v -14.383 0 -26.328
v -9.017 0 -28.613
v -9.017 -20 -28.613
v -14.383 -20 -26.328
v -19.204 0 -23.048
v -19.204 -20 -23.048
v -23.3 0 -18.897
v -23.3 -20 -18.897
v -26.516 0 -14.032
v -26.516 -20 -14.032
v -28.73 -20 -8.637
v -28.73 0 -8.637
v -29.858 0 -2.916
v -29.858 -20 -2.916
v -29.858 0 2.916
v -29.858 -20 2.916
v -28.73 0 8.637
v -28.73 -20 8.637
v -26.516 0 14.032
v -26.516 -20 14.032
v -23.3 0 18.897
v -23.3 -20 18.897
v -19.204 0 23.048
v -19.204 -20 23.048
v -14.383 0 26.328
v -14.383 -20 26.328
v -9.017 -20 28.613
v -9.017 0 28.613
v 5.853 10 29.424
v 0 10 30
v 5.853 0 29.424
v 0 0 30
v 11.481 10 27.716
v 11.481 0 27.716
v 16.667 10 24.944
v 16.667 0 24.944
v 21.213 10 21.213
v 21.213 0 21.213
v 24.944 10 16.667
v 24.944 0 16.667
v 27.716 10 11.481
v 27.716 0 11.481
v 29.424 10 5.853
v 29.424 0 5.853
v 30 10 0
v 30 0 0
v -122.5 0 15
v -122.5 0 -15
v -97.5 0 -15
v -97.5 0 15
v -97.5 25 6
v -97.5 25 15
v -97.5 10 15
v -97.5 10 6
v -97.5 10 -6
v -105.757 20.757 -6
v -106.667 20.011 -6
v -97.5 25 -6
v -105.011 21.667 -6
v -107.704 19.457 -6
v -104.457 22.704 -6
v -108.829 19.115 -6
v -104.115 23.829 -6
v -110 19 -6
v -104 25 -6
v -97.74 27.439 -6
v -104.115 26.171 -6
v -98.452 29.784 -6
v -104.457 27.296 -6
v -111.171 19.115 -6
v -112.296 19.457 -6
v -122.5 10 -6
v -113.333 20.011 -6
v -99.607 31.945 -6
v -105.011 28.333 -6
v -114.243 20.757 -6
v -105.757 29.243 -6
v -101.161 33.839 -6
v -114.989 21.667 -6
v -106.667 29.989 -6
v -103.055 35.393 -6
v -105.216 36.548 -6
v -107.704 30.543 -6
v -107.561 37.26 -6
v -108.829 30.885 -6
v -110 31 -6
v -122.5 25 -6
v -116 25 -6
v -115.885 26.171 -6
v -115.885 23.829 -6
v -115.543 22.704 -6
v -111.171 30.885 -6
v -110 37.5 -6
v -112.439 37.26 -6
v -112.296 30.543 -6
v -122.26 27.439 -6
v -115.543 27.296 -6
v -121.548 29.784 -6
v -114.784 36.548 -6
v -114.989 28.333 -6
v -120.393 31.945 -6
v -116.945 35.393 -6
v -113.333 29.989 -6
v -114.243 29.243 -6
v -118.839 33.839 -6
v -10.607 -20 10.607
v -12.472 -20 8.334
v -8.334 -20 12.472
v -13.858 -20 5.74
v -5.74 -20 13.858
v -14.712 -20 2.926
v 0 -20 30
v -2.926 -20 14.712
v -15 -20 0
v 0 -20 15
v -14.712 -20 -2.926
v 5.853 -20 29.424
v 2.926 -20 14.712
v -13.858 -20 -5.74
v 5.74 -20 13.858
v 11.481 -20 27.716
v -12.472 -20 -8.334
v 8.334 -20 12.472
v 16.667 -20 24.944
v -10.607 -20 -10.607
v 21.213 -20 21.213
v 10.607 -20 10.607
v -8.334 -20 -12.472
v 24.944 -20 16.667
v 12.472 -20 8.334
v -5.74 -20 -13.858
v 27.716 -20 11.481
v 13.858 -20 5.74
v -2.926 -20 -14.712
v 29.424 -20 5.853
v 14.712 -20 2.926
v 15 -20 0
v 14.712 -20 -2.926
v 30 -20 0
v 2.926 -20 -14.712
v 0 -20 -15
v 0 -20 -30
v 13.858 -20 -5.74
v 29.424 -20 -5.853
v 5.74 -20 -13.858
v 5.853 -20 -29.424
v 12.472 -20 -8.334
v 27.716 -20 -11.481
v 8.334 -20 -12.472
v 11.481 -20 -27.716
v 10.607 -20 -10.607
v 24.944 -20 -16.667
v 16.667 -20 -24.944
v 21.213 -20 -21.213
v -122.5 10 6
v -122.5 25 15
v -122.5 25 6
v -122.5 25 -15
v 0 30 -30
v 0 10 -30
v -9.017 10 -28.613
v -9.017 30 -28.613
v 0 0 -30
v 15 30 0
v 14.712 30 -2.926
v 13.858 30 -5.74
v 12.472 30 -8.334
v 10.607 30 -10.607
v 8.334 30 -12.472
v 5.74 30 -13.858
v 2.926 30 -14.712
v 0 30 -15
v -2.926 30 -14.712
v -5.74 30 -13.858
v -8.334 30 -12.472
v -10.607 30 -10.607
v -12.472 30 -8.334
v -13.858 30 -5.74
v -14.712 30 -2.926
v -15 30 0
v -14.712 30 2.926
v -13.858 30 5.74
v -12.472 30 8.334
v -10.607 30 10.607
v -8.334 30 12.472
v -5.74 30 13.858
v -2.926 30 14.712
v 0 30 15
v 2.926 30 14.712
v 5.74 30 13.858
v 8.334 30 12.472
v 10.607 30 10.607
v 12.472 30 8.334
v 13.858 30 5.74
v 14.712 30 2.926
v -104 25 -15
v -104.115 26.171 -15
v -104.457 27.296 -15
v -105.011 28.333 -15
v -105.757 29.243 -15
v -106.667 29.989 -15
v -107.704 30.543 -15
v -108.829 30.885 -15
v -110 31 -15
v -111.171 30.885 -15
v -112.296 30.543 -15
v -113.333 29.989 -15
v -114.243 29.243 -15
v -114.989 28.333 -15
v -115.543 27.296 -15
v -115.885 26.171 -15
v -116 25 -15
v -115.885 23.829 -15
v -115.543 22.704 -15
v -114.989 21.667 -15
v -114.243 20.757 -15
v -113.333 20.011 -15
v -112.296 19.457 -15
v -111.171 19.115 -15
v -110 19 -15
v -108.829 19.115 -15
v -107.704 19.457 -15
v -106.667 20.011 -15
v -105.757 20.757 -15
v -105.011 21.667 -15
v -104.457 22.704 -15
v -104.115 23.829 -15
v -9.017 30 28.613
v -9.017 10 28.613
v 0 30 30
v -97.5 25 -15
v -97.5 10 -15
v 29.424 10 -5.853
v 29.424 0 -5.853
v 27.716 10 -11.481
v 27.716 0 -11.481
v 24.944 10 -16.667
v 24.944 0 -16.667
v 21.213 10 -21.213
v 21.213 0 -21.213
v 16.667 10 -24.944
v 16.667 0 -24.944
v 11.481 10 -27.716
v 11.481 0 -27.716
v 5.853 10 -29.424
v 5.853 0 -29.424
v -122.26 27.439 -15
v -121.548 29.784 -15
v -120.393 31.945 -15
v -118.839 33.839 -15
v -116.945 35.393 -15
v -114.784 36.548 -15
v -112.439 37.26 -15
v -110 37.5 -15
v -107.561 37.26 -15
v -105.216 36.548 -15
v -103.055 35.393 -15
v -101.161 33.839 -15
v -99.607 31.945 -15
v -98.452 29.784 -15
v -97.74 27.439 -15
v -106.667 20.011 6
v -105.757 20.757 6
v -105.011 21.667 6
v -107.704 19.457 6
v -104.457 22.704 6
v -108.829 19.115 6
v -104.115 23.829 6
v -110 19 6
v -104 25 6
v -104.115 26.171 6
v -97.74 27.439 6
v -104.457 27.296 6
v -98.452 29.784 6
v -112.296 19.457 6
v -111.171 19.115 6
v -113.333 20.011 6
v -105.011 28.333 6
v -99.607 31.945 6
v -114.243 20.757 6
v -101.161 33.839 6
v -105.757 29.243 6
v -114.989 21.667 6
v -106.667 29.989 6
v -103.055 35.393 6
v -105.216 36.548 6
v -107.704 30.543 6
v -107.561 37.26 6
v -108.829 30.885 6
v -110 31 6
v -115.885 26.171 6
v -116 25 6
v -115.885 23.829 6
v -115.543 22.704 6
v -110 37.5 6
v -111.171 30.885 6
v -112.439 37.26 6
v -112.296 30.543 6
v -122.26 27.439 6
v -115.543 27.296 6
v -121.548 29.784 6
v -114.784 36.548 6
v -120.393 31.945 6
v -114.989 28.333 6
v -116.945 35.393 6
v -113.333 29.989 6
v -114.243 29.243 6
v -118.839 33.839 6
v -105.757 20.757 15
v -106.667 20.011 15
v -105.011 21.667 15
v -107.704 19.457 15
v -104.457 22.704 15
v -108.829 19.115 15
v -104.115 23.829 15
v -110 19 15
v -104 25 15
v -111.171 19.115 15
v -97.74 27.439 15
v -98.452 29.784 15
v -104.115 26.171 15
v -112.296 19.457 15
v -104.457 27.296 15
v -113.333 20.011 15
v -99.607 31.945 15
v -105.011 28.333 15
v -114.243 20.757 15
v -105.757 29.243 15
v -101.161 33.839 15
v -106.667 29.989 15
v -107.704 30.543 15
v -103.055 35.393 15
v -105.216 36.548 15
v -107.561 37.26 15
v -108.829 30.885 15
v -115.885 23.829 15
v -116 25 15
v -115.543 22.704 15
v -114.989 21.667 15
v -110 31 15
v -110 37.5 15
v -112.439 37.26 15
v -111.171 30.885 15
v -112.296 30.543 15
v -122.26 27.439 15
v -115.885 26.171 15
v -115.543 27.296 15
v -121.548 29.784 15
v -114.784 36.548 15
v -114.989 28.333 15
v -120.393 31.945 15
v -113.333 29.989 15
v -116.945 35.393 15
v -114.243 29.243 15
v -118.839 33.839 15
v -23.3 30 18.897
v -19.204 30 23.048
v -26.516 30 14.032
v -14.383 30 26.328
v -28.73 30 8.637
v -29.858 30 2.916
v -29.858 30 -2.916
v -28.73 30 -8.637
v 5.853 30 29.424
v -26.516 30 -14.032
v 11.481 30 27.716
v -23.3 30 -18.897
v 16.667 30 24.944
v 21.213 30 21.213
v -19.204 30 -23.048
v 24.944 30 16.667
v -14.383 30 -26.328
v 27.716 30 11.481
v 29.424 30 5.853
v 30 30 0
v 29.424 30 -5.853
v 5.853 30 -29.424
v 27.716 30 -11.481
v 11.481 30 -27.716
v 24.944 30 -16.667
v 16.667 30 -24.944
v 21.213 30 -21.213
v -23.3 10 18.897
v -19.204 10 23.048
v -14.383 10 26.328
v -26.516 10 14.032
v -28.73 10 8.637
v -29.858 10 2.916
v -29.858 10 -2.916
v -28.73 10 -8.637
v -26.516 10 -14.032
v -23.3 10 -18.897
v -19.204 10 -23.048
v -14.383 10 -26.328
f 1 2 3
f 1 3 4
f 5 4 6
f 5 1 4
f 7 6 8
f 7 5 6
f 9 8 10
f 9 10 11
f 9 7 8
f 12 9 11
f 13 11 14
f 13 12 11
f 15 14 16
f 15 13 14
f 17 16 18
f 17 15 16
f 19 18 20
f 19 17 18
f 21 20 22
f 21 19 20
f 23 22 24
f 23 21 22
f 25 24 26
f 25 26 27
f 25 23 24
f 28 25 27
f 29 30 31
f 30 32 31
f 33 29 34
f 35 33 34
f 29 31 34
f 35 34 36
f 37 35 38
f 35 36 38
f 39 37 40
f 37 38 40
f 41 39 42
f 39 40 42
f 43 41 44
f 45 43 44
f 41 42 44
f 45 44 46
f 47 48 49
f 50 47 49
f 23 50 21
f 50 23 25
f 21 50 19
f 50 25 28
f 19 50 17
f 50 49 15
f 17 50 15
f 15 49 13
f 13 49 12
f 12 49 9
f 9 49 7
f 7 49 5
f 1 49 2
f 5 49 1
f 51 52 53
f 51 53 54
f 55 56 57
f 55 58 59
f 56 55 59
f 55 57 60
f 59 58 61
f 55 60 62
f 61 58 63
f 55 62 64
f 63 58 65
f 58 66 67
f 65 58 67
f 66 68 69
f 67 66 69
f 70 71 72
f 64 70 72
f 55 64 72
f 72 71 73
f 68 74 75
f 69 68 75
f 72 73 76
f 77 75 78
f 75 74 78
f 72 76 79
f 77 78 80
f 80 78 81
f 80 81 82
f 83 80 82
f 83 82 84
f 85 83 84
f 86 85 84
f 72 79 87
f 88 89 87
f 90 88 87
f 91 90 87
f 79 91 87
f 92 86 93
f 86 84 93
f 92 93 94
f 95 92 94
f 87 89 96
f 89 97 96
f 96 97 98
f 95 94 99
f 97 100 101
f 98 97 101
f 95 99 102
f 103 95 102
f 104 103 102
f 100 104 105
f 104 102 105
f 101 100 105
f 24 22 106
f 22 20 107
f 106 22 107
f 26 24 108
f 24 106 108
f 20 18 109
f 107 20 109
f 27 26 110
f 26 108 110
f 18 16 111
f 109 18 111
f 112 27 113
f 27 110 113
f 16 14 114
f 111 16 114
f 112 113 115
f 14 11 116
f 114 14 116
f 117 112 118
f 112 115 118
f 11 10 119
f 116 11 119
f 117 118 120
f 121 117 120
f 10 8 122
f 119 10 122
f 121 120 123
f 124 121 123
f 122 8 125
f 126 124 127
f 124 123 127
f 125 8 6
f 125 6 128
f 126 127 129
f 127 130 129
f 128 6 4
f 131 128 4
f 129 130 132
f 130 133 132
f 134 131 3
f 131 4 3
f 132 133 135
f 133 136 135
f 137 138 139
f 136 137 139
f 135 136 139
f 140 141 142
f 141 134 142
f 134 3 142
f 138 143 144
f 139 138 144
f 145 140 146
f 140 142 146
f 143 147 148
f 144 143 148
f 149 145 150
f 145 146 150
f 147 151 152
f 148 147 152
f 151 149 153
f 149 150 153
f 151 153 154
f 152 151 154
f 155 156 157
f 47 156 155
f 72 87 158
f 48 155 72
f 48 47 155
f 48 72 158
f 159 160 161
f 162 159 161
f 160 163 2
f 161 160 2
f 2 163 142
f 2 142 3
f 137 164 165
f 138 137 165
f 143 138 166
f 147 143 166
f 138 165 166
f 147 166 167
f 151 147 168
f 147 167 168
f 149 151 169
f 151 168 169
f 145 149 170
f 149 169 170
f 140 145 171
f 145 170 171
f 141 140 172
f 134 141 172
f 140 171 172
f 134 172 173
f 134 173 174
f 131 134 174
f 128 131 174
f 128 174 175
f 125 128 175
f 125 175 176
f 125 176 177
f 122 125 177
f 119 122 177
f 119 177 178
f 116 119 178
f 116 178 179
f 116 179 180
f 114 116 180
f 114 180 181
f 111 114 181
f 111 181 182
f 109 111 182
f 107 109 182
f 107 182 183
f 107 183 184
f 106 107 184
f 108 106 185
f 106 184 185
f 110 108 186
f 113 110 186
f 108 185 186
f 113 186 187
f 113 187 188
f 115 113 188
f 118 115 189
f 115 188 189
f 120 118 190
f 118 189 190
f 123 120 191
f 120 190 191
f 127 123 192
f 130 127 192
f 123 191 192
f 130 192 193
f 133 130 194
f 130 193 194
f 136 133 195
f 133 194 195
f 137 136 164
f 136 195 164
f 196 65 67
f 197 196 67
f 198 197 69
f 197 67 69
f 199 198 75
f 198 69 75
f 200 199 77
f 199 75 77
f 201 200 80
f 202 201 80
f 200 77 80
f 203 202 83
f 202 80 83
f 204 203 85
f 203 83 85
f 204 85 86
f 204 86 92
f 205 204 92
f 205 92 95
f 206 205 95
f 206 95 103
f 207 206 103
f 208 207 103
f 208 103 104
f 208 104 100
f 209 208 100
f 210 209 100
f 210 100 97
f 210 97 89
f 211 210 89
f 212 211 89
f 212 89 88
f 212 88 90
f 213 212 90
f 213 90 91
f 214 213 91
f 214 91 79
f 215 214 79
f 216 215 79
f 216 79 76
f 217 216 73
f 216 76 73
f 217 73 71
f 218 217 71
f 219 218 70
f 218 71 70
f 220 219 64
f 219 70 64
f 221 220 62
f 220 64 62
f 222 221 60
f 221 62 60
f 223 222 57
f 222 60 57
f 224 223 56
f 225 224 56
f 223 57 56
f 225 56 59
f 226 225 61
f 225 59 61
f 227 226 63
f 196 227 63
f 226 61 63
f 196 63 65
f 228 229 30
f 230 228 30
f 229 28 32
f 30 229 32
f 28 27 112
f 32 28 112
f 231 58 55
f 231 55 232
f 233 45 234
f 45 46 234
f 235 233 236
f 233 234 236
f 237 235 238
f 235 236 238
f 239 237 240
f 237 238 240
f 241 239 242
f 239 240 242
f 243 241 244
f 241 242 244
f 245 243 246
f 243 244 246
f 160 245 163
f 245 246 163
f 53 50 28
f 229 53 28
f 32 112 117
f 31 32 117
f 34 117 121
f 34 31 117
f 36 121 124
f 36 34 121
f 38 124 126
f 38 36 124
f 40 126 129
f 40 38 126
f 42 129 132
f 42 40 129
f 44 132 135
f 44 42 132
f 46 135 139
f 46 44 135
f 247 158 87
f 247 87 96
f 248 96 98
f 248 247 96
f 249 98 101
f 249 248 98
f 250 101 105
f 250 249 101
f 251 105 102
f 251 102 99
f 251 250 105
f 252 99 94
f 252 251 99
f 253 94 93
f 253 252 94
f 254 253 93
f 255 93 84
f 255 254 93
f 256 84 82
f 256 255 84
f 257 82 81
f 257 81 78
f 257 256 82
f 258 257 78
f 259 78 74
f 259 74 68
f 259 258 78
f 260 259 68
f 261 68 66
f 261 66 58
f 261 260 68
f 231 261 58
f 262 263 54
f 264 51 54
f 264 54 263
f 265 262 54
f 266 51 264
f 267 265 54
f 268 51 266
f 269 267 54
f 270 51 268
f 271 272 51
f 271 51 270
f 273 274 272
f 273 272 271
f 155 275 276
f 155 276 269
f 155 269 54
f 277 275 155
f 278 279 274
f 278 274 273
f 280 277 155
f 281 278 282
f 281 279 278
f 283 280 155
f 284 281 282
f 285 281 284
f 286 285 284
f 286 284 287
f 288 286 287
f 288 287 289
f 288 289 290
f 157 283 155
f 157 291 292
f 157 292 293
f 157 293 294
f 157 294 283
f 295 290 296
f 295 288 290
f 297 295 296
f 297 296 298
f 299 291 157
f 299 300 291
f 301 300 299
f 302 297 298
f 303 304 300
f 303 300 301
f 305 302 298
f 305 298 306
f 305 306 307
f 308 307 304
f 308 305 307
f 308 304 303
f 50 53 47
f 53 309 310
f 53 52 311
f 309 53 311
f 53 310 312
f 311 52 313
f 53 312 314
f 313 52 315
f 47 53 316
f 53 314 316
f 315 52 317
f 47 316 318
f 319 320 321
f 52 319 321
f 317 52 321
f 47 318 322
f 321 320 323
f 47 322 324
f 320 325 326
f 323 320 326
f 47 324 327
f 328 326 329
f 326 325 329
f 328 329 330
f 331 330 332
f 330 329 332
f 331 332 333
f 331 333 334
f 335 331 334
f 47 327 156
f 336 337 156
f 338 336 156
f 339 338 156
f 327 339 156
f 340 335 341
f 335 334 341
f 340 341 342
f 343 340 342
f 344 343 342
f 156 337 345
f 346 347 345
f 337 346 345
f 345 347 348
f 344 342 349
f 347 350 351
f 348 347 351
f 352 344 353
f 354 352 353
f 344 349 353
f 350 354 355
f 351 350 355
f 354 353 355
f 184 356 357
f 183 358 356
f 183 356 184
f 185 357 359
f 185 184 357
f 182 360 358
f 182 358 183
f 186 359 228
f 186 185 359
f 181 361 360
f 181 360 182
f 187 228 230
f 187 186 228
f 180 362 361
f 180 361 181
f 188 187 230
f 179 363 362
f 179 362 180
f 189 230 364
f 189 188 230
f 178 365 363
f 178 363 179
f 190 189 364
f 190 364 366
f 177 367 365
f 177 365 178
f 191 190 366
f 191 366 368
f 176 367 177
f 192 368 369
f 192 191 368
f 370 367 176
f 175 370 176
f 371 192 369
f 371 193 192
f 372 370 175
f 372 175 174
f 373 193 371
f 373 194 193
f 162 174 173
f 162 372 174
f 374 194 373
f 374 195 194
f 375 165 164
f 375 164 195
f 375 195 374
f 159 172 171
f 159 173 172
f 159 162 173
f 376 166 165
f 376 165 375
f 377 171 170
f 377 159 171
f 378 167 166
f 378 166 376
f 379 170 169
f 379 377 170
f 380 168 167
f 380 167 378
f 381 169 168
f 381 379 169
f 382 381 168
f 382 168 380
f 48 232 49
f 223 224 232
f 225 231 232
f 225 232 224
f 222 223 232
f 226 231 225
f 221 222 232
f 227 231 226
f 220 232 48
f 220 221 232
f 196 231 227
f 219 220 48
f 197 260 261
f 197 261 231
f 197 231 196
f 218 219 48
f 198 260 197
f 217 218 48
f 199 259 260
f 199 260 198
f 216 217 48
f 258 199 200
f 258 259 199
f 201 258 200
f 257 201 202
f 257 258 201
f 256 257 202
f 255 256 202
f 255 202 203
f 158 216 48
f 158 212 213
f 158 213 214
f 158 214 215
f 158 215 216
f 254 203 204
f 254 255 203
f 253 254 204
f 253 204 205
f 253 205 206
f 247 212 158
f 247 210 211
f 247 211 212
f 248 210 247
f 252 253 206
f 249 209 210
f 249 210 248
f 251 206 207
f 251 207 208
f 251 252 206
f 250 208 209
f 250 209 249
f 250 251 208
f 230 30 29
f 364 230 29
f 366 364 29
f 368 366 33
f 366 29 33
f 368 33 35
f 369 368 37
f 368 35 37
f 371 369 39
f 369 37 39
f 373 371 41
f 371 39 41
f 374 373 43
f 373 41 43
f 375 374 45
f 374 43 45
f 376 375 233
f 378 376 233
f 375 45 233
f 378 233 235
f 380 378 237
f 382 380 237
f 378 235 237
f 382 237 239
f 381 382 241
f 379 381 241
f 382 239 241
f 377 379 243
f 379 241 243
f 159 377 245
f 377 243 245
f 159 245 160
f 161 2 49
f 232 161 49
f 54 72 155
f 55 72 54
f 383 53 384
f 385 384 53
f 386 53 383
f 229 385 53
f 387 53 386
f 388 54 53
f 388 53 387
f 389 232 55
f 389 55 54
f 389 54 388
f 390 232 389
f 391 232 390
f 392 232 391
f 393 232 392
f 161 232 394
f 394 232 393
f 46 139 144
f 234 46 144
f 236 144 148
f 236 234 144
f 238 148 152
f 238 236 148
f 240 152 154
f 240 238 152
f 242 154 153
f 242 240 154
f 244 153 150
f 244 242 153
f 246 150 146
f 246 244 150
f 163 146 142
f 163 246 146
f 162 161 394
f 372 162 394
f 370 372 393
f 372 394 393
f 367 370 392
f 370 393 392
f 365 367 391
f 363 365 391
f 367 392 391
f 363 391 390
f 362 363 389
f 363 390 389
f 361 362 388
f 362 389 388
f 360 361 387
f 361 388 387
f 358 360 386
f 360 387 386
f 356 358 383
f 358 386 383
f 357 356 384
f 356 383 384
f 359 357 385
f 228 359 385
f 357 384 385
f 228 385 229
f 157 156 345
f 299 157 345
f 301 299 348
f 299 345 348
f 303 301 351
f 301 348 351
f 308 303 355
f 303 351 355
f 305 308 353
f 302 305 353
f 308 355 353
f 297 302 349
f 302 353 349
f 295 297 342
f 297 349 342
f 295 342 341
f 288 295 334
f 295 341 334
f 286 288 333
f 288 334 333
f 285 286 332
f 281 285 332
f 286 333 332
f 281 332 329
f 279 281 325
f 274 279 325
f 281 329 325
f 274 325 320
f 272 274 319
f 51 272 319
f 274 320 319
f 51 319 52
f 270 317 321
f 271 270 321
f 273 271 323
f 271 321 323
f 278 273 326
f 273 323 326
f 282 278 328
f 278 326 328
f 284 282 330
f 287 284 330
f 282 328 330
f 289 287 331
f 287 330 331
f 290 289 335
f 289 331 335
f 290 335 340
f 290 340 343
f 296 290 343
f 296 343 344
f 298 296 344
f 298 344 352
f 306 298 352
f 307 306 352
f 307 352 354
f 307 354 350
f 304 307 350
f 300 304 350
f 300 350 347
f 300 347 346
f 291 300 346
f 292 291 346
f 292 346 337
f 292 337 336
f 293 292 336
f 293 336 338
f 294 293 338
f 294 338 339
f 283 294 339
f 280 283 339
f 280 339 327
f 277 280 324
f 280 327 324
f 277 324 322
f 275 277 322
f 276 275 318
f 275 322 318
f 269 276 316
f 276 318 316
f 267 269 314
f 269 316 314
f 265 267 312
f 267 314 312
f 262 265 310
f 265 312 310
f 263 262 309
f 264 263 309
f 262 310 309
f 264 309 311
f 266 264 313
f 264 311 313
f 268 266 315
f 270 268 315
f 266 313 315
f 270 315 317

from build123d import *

# Parameters (mm, degrees)
BOSS_EXTRUDE2_DEPTH      = 10
BOSS_EXTRUDE3_DEPTH      = 20
BOSS_EXTRUDE3_DEPTH_BACK = 30
SKETCH4_R                = 15
CUT_EXTRUDE1_DEPTH       = 51
SKETCH5_W                = 25
SKETCH5_H                = 9
BOSS_EXTRUDE4_DEPTH      = 15
BOSS_EXTRUDE5_DEPTH      = 9
BOSS_EXTRUDE6_DEPTH      = 9
SKETCH8_R                = 6
CUT_EXTRUDE2_DEPTH       = 46


with BuildPart() as part:
    # Sketch1 → Boss-Extrude2 (new body)
    with BuildSketch(Plane(origin=(0, 0, 0), x_dir=(1, 0, 0), z_dir=(0, 1, 0))):
        with BuildLine():
            Line((-9.01734104, 28.612716763), (-97.5, 15))
            Line((-97.5, 15), (-122.5, 15))
            Line((-122.5, 15), (-122.5, -15))
            Line((-122.5, -15), (-97.5, -15))
            Line((-97.5, -15), (-9.01734104, -28.612716763))
            ThreePointArc((-9.01734104, -28.612716763), (-30, 0), (-9.01734104, 28.612716763))
        make_face()
        with BuildLine():
            Line((0, 30), (-9.01734104, 28.612716763))
            ThreePointArc((-9.01734104, 28.612716763), (-30, 0), (-9.01734104, -28.612716763))
            Line((-9.01734104, -28.612716763), (0, -30))
            ThreePointArc((0, -30), (21.213203436, -21.213203436), (30, 0))
            ThreePointArc((30, 0), (21.213203436, 21.213203436), (0, 30))
        make_face()
    extrude(amount=BOSS_EXTRUDE2_DEPTH)

    # Sketch3 → Boss-Extrude3 (add, two sides)
    with BuildSketch(Plane(origin=(0, 10, 0), x_dir=(1, 0, 0), z_dir=(0, 1, 0))) as boss_extrude3_sk:
        with BuildLine():
            Line((0, 30), (-9.01734104, 28.612716763))
            ThreePointArc((-9.01734104, 28.612716763), (-30, 0), (-9.01734104, -28.612716763))
            Line((-9.01734104, -28.612716763), (0, -30))
            ThreePointArc((0, -30), (21.213203436, -21.213203436), (30, 0))
            ThreePointArc((30, 0), (21.213203436, 21.213203436), (0, 30))
        make_face()
    extrude(amount=BOSS_EXTRUDE3_DEPTH)
    extrude(boss_extrude3_sk.sketch, amount=-BOSS_EXTRUDE3_DEPTH_BACK)

    # Sketch4 → Cut-Extrude1 (cut, through all)
    with BuildSketch(Plane(origin=(0, 30, 0), x_dir=(1, 0, 0), z_dir=(0, 1, 0))):
        Circle(SKETCH4_R)
    extrude(amount=-CUT_EXTRUDE1_DEPTH, mode=Mode.SUBTRACT)

    # Sketch5 → Boss-Extrude4 (add)
    with BuildSketch(Plane(origin=(0, 10, 0), x_dir=(1, 0, 0), z_dir=(0, 1, 0))):
        with Locations((-110, 10.5)):
            Rectangle(SKETCH5_W, SKETCH5_H)
        with Locations((-110, -10.5)):
            Rectangle(SKETCH5_W, SKETCH5_H)
    extrude(amount=BOSS_EXTRUDE4_DEPTH)

    # Sketch6 → Boss-Extrude5 (add)
    with BuildSketch(Plane.XY.offset(15)):
        with BuildLine():
            ThreePointArc((-122.5, 25), (-110, 37.5), (-97.5, 25))
            Line((-97.5, 25), (-122.5, 25))
        make_face()
    extrude(amount=-BOSS_EXTRUDE5_DEPTH)

    # Sketch7 → Boss-Extrude6 (add)
    with BuildSketch(Plane(origin=(0, 0, -15), x_dir=(-1, 0, 0), z_dir=(0, 0, -1))):
        with BuildLine():
            Line((97.5, 25), (122.5, 25))
            ThreePointArc((122.5, 25), (110, 37.5), (97.5, 25))
        make_face()
    extrude(amount=-BOSS_EXTRUDE6_DEPTH)

    # Sketch8 → Cut-Extrude2 (cut, through all)
    with BuildSketch(Plane.XY.offset(15)):
        with Locations((-110, 25)):
            Circle(SKETCH8_R)
    extrude(amount=-CUT_EXTRUDE2_DEPTH, mode=Mode.SUBTRACT)


solid = part.part
